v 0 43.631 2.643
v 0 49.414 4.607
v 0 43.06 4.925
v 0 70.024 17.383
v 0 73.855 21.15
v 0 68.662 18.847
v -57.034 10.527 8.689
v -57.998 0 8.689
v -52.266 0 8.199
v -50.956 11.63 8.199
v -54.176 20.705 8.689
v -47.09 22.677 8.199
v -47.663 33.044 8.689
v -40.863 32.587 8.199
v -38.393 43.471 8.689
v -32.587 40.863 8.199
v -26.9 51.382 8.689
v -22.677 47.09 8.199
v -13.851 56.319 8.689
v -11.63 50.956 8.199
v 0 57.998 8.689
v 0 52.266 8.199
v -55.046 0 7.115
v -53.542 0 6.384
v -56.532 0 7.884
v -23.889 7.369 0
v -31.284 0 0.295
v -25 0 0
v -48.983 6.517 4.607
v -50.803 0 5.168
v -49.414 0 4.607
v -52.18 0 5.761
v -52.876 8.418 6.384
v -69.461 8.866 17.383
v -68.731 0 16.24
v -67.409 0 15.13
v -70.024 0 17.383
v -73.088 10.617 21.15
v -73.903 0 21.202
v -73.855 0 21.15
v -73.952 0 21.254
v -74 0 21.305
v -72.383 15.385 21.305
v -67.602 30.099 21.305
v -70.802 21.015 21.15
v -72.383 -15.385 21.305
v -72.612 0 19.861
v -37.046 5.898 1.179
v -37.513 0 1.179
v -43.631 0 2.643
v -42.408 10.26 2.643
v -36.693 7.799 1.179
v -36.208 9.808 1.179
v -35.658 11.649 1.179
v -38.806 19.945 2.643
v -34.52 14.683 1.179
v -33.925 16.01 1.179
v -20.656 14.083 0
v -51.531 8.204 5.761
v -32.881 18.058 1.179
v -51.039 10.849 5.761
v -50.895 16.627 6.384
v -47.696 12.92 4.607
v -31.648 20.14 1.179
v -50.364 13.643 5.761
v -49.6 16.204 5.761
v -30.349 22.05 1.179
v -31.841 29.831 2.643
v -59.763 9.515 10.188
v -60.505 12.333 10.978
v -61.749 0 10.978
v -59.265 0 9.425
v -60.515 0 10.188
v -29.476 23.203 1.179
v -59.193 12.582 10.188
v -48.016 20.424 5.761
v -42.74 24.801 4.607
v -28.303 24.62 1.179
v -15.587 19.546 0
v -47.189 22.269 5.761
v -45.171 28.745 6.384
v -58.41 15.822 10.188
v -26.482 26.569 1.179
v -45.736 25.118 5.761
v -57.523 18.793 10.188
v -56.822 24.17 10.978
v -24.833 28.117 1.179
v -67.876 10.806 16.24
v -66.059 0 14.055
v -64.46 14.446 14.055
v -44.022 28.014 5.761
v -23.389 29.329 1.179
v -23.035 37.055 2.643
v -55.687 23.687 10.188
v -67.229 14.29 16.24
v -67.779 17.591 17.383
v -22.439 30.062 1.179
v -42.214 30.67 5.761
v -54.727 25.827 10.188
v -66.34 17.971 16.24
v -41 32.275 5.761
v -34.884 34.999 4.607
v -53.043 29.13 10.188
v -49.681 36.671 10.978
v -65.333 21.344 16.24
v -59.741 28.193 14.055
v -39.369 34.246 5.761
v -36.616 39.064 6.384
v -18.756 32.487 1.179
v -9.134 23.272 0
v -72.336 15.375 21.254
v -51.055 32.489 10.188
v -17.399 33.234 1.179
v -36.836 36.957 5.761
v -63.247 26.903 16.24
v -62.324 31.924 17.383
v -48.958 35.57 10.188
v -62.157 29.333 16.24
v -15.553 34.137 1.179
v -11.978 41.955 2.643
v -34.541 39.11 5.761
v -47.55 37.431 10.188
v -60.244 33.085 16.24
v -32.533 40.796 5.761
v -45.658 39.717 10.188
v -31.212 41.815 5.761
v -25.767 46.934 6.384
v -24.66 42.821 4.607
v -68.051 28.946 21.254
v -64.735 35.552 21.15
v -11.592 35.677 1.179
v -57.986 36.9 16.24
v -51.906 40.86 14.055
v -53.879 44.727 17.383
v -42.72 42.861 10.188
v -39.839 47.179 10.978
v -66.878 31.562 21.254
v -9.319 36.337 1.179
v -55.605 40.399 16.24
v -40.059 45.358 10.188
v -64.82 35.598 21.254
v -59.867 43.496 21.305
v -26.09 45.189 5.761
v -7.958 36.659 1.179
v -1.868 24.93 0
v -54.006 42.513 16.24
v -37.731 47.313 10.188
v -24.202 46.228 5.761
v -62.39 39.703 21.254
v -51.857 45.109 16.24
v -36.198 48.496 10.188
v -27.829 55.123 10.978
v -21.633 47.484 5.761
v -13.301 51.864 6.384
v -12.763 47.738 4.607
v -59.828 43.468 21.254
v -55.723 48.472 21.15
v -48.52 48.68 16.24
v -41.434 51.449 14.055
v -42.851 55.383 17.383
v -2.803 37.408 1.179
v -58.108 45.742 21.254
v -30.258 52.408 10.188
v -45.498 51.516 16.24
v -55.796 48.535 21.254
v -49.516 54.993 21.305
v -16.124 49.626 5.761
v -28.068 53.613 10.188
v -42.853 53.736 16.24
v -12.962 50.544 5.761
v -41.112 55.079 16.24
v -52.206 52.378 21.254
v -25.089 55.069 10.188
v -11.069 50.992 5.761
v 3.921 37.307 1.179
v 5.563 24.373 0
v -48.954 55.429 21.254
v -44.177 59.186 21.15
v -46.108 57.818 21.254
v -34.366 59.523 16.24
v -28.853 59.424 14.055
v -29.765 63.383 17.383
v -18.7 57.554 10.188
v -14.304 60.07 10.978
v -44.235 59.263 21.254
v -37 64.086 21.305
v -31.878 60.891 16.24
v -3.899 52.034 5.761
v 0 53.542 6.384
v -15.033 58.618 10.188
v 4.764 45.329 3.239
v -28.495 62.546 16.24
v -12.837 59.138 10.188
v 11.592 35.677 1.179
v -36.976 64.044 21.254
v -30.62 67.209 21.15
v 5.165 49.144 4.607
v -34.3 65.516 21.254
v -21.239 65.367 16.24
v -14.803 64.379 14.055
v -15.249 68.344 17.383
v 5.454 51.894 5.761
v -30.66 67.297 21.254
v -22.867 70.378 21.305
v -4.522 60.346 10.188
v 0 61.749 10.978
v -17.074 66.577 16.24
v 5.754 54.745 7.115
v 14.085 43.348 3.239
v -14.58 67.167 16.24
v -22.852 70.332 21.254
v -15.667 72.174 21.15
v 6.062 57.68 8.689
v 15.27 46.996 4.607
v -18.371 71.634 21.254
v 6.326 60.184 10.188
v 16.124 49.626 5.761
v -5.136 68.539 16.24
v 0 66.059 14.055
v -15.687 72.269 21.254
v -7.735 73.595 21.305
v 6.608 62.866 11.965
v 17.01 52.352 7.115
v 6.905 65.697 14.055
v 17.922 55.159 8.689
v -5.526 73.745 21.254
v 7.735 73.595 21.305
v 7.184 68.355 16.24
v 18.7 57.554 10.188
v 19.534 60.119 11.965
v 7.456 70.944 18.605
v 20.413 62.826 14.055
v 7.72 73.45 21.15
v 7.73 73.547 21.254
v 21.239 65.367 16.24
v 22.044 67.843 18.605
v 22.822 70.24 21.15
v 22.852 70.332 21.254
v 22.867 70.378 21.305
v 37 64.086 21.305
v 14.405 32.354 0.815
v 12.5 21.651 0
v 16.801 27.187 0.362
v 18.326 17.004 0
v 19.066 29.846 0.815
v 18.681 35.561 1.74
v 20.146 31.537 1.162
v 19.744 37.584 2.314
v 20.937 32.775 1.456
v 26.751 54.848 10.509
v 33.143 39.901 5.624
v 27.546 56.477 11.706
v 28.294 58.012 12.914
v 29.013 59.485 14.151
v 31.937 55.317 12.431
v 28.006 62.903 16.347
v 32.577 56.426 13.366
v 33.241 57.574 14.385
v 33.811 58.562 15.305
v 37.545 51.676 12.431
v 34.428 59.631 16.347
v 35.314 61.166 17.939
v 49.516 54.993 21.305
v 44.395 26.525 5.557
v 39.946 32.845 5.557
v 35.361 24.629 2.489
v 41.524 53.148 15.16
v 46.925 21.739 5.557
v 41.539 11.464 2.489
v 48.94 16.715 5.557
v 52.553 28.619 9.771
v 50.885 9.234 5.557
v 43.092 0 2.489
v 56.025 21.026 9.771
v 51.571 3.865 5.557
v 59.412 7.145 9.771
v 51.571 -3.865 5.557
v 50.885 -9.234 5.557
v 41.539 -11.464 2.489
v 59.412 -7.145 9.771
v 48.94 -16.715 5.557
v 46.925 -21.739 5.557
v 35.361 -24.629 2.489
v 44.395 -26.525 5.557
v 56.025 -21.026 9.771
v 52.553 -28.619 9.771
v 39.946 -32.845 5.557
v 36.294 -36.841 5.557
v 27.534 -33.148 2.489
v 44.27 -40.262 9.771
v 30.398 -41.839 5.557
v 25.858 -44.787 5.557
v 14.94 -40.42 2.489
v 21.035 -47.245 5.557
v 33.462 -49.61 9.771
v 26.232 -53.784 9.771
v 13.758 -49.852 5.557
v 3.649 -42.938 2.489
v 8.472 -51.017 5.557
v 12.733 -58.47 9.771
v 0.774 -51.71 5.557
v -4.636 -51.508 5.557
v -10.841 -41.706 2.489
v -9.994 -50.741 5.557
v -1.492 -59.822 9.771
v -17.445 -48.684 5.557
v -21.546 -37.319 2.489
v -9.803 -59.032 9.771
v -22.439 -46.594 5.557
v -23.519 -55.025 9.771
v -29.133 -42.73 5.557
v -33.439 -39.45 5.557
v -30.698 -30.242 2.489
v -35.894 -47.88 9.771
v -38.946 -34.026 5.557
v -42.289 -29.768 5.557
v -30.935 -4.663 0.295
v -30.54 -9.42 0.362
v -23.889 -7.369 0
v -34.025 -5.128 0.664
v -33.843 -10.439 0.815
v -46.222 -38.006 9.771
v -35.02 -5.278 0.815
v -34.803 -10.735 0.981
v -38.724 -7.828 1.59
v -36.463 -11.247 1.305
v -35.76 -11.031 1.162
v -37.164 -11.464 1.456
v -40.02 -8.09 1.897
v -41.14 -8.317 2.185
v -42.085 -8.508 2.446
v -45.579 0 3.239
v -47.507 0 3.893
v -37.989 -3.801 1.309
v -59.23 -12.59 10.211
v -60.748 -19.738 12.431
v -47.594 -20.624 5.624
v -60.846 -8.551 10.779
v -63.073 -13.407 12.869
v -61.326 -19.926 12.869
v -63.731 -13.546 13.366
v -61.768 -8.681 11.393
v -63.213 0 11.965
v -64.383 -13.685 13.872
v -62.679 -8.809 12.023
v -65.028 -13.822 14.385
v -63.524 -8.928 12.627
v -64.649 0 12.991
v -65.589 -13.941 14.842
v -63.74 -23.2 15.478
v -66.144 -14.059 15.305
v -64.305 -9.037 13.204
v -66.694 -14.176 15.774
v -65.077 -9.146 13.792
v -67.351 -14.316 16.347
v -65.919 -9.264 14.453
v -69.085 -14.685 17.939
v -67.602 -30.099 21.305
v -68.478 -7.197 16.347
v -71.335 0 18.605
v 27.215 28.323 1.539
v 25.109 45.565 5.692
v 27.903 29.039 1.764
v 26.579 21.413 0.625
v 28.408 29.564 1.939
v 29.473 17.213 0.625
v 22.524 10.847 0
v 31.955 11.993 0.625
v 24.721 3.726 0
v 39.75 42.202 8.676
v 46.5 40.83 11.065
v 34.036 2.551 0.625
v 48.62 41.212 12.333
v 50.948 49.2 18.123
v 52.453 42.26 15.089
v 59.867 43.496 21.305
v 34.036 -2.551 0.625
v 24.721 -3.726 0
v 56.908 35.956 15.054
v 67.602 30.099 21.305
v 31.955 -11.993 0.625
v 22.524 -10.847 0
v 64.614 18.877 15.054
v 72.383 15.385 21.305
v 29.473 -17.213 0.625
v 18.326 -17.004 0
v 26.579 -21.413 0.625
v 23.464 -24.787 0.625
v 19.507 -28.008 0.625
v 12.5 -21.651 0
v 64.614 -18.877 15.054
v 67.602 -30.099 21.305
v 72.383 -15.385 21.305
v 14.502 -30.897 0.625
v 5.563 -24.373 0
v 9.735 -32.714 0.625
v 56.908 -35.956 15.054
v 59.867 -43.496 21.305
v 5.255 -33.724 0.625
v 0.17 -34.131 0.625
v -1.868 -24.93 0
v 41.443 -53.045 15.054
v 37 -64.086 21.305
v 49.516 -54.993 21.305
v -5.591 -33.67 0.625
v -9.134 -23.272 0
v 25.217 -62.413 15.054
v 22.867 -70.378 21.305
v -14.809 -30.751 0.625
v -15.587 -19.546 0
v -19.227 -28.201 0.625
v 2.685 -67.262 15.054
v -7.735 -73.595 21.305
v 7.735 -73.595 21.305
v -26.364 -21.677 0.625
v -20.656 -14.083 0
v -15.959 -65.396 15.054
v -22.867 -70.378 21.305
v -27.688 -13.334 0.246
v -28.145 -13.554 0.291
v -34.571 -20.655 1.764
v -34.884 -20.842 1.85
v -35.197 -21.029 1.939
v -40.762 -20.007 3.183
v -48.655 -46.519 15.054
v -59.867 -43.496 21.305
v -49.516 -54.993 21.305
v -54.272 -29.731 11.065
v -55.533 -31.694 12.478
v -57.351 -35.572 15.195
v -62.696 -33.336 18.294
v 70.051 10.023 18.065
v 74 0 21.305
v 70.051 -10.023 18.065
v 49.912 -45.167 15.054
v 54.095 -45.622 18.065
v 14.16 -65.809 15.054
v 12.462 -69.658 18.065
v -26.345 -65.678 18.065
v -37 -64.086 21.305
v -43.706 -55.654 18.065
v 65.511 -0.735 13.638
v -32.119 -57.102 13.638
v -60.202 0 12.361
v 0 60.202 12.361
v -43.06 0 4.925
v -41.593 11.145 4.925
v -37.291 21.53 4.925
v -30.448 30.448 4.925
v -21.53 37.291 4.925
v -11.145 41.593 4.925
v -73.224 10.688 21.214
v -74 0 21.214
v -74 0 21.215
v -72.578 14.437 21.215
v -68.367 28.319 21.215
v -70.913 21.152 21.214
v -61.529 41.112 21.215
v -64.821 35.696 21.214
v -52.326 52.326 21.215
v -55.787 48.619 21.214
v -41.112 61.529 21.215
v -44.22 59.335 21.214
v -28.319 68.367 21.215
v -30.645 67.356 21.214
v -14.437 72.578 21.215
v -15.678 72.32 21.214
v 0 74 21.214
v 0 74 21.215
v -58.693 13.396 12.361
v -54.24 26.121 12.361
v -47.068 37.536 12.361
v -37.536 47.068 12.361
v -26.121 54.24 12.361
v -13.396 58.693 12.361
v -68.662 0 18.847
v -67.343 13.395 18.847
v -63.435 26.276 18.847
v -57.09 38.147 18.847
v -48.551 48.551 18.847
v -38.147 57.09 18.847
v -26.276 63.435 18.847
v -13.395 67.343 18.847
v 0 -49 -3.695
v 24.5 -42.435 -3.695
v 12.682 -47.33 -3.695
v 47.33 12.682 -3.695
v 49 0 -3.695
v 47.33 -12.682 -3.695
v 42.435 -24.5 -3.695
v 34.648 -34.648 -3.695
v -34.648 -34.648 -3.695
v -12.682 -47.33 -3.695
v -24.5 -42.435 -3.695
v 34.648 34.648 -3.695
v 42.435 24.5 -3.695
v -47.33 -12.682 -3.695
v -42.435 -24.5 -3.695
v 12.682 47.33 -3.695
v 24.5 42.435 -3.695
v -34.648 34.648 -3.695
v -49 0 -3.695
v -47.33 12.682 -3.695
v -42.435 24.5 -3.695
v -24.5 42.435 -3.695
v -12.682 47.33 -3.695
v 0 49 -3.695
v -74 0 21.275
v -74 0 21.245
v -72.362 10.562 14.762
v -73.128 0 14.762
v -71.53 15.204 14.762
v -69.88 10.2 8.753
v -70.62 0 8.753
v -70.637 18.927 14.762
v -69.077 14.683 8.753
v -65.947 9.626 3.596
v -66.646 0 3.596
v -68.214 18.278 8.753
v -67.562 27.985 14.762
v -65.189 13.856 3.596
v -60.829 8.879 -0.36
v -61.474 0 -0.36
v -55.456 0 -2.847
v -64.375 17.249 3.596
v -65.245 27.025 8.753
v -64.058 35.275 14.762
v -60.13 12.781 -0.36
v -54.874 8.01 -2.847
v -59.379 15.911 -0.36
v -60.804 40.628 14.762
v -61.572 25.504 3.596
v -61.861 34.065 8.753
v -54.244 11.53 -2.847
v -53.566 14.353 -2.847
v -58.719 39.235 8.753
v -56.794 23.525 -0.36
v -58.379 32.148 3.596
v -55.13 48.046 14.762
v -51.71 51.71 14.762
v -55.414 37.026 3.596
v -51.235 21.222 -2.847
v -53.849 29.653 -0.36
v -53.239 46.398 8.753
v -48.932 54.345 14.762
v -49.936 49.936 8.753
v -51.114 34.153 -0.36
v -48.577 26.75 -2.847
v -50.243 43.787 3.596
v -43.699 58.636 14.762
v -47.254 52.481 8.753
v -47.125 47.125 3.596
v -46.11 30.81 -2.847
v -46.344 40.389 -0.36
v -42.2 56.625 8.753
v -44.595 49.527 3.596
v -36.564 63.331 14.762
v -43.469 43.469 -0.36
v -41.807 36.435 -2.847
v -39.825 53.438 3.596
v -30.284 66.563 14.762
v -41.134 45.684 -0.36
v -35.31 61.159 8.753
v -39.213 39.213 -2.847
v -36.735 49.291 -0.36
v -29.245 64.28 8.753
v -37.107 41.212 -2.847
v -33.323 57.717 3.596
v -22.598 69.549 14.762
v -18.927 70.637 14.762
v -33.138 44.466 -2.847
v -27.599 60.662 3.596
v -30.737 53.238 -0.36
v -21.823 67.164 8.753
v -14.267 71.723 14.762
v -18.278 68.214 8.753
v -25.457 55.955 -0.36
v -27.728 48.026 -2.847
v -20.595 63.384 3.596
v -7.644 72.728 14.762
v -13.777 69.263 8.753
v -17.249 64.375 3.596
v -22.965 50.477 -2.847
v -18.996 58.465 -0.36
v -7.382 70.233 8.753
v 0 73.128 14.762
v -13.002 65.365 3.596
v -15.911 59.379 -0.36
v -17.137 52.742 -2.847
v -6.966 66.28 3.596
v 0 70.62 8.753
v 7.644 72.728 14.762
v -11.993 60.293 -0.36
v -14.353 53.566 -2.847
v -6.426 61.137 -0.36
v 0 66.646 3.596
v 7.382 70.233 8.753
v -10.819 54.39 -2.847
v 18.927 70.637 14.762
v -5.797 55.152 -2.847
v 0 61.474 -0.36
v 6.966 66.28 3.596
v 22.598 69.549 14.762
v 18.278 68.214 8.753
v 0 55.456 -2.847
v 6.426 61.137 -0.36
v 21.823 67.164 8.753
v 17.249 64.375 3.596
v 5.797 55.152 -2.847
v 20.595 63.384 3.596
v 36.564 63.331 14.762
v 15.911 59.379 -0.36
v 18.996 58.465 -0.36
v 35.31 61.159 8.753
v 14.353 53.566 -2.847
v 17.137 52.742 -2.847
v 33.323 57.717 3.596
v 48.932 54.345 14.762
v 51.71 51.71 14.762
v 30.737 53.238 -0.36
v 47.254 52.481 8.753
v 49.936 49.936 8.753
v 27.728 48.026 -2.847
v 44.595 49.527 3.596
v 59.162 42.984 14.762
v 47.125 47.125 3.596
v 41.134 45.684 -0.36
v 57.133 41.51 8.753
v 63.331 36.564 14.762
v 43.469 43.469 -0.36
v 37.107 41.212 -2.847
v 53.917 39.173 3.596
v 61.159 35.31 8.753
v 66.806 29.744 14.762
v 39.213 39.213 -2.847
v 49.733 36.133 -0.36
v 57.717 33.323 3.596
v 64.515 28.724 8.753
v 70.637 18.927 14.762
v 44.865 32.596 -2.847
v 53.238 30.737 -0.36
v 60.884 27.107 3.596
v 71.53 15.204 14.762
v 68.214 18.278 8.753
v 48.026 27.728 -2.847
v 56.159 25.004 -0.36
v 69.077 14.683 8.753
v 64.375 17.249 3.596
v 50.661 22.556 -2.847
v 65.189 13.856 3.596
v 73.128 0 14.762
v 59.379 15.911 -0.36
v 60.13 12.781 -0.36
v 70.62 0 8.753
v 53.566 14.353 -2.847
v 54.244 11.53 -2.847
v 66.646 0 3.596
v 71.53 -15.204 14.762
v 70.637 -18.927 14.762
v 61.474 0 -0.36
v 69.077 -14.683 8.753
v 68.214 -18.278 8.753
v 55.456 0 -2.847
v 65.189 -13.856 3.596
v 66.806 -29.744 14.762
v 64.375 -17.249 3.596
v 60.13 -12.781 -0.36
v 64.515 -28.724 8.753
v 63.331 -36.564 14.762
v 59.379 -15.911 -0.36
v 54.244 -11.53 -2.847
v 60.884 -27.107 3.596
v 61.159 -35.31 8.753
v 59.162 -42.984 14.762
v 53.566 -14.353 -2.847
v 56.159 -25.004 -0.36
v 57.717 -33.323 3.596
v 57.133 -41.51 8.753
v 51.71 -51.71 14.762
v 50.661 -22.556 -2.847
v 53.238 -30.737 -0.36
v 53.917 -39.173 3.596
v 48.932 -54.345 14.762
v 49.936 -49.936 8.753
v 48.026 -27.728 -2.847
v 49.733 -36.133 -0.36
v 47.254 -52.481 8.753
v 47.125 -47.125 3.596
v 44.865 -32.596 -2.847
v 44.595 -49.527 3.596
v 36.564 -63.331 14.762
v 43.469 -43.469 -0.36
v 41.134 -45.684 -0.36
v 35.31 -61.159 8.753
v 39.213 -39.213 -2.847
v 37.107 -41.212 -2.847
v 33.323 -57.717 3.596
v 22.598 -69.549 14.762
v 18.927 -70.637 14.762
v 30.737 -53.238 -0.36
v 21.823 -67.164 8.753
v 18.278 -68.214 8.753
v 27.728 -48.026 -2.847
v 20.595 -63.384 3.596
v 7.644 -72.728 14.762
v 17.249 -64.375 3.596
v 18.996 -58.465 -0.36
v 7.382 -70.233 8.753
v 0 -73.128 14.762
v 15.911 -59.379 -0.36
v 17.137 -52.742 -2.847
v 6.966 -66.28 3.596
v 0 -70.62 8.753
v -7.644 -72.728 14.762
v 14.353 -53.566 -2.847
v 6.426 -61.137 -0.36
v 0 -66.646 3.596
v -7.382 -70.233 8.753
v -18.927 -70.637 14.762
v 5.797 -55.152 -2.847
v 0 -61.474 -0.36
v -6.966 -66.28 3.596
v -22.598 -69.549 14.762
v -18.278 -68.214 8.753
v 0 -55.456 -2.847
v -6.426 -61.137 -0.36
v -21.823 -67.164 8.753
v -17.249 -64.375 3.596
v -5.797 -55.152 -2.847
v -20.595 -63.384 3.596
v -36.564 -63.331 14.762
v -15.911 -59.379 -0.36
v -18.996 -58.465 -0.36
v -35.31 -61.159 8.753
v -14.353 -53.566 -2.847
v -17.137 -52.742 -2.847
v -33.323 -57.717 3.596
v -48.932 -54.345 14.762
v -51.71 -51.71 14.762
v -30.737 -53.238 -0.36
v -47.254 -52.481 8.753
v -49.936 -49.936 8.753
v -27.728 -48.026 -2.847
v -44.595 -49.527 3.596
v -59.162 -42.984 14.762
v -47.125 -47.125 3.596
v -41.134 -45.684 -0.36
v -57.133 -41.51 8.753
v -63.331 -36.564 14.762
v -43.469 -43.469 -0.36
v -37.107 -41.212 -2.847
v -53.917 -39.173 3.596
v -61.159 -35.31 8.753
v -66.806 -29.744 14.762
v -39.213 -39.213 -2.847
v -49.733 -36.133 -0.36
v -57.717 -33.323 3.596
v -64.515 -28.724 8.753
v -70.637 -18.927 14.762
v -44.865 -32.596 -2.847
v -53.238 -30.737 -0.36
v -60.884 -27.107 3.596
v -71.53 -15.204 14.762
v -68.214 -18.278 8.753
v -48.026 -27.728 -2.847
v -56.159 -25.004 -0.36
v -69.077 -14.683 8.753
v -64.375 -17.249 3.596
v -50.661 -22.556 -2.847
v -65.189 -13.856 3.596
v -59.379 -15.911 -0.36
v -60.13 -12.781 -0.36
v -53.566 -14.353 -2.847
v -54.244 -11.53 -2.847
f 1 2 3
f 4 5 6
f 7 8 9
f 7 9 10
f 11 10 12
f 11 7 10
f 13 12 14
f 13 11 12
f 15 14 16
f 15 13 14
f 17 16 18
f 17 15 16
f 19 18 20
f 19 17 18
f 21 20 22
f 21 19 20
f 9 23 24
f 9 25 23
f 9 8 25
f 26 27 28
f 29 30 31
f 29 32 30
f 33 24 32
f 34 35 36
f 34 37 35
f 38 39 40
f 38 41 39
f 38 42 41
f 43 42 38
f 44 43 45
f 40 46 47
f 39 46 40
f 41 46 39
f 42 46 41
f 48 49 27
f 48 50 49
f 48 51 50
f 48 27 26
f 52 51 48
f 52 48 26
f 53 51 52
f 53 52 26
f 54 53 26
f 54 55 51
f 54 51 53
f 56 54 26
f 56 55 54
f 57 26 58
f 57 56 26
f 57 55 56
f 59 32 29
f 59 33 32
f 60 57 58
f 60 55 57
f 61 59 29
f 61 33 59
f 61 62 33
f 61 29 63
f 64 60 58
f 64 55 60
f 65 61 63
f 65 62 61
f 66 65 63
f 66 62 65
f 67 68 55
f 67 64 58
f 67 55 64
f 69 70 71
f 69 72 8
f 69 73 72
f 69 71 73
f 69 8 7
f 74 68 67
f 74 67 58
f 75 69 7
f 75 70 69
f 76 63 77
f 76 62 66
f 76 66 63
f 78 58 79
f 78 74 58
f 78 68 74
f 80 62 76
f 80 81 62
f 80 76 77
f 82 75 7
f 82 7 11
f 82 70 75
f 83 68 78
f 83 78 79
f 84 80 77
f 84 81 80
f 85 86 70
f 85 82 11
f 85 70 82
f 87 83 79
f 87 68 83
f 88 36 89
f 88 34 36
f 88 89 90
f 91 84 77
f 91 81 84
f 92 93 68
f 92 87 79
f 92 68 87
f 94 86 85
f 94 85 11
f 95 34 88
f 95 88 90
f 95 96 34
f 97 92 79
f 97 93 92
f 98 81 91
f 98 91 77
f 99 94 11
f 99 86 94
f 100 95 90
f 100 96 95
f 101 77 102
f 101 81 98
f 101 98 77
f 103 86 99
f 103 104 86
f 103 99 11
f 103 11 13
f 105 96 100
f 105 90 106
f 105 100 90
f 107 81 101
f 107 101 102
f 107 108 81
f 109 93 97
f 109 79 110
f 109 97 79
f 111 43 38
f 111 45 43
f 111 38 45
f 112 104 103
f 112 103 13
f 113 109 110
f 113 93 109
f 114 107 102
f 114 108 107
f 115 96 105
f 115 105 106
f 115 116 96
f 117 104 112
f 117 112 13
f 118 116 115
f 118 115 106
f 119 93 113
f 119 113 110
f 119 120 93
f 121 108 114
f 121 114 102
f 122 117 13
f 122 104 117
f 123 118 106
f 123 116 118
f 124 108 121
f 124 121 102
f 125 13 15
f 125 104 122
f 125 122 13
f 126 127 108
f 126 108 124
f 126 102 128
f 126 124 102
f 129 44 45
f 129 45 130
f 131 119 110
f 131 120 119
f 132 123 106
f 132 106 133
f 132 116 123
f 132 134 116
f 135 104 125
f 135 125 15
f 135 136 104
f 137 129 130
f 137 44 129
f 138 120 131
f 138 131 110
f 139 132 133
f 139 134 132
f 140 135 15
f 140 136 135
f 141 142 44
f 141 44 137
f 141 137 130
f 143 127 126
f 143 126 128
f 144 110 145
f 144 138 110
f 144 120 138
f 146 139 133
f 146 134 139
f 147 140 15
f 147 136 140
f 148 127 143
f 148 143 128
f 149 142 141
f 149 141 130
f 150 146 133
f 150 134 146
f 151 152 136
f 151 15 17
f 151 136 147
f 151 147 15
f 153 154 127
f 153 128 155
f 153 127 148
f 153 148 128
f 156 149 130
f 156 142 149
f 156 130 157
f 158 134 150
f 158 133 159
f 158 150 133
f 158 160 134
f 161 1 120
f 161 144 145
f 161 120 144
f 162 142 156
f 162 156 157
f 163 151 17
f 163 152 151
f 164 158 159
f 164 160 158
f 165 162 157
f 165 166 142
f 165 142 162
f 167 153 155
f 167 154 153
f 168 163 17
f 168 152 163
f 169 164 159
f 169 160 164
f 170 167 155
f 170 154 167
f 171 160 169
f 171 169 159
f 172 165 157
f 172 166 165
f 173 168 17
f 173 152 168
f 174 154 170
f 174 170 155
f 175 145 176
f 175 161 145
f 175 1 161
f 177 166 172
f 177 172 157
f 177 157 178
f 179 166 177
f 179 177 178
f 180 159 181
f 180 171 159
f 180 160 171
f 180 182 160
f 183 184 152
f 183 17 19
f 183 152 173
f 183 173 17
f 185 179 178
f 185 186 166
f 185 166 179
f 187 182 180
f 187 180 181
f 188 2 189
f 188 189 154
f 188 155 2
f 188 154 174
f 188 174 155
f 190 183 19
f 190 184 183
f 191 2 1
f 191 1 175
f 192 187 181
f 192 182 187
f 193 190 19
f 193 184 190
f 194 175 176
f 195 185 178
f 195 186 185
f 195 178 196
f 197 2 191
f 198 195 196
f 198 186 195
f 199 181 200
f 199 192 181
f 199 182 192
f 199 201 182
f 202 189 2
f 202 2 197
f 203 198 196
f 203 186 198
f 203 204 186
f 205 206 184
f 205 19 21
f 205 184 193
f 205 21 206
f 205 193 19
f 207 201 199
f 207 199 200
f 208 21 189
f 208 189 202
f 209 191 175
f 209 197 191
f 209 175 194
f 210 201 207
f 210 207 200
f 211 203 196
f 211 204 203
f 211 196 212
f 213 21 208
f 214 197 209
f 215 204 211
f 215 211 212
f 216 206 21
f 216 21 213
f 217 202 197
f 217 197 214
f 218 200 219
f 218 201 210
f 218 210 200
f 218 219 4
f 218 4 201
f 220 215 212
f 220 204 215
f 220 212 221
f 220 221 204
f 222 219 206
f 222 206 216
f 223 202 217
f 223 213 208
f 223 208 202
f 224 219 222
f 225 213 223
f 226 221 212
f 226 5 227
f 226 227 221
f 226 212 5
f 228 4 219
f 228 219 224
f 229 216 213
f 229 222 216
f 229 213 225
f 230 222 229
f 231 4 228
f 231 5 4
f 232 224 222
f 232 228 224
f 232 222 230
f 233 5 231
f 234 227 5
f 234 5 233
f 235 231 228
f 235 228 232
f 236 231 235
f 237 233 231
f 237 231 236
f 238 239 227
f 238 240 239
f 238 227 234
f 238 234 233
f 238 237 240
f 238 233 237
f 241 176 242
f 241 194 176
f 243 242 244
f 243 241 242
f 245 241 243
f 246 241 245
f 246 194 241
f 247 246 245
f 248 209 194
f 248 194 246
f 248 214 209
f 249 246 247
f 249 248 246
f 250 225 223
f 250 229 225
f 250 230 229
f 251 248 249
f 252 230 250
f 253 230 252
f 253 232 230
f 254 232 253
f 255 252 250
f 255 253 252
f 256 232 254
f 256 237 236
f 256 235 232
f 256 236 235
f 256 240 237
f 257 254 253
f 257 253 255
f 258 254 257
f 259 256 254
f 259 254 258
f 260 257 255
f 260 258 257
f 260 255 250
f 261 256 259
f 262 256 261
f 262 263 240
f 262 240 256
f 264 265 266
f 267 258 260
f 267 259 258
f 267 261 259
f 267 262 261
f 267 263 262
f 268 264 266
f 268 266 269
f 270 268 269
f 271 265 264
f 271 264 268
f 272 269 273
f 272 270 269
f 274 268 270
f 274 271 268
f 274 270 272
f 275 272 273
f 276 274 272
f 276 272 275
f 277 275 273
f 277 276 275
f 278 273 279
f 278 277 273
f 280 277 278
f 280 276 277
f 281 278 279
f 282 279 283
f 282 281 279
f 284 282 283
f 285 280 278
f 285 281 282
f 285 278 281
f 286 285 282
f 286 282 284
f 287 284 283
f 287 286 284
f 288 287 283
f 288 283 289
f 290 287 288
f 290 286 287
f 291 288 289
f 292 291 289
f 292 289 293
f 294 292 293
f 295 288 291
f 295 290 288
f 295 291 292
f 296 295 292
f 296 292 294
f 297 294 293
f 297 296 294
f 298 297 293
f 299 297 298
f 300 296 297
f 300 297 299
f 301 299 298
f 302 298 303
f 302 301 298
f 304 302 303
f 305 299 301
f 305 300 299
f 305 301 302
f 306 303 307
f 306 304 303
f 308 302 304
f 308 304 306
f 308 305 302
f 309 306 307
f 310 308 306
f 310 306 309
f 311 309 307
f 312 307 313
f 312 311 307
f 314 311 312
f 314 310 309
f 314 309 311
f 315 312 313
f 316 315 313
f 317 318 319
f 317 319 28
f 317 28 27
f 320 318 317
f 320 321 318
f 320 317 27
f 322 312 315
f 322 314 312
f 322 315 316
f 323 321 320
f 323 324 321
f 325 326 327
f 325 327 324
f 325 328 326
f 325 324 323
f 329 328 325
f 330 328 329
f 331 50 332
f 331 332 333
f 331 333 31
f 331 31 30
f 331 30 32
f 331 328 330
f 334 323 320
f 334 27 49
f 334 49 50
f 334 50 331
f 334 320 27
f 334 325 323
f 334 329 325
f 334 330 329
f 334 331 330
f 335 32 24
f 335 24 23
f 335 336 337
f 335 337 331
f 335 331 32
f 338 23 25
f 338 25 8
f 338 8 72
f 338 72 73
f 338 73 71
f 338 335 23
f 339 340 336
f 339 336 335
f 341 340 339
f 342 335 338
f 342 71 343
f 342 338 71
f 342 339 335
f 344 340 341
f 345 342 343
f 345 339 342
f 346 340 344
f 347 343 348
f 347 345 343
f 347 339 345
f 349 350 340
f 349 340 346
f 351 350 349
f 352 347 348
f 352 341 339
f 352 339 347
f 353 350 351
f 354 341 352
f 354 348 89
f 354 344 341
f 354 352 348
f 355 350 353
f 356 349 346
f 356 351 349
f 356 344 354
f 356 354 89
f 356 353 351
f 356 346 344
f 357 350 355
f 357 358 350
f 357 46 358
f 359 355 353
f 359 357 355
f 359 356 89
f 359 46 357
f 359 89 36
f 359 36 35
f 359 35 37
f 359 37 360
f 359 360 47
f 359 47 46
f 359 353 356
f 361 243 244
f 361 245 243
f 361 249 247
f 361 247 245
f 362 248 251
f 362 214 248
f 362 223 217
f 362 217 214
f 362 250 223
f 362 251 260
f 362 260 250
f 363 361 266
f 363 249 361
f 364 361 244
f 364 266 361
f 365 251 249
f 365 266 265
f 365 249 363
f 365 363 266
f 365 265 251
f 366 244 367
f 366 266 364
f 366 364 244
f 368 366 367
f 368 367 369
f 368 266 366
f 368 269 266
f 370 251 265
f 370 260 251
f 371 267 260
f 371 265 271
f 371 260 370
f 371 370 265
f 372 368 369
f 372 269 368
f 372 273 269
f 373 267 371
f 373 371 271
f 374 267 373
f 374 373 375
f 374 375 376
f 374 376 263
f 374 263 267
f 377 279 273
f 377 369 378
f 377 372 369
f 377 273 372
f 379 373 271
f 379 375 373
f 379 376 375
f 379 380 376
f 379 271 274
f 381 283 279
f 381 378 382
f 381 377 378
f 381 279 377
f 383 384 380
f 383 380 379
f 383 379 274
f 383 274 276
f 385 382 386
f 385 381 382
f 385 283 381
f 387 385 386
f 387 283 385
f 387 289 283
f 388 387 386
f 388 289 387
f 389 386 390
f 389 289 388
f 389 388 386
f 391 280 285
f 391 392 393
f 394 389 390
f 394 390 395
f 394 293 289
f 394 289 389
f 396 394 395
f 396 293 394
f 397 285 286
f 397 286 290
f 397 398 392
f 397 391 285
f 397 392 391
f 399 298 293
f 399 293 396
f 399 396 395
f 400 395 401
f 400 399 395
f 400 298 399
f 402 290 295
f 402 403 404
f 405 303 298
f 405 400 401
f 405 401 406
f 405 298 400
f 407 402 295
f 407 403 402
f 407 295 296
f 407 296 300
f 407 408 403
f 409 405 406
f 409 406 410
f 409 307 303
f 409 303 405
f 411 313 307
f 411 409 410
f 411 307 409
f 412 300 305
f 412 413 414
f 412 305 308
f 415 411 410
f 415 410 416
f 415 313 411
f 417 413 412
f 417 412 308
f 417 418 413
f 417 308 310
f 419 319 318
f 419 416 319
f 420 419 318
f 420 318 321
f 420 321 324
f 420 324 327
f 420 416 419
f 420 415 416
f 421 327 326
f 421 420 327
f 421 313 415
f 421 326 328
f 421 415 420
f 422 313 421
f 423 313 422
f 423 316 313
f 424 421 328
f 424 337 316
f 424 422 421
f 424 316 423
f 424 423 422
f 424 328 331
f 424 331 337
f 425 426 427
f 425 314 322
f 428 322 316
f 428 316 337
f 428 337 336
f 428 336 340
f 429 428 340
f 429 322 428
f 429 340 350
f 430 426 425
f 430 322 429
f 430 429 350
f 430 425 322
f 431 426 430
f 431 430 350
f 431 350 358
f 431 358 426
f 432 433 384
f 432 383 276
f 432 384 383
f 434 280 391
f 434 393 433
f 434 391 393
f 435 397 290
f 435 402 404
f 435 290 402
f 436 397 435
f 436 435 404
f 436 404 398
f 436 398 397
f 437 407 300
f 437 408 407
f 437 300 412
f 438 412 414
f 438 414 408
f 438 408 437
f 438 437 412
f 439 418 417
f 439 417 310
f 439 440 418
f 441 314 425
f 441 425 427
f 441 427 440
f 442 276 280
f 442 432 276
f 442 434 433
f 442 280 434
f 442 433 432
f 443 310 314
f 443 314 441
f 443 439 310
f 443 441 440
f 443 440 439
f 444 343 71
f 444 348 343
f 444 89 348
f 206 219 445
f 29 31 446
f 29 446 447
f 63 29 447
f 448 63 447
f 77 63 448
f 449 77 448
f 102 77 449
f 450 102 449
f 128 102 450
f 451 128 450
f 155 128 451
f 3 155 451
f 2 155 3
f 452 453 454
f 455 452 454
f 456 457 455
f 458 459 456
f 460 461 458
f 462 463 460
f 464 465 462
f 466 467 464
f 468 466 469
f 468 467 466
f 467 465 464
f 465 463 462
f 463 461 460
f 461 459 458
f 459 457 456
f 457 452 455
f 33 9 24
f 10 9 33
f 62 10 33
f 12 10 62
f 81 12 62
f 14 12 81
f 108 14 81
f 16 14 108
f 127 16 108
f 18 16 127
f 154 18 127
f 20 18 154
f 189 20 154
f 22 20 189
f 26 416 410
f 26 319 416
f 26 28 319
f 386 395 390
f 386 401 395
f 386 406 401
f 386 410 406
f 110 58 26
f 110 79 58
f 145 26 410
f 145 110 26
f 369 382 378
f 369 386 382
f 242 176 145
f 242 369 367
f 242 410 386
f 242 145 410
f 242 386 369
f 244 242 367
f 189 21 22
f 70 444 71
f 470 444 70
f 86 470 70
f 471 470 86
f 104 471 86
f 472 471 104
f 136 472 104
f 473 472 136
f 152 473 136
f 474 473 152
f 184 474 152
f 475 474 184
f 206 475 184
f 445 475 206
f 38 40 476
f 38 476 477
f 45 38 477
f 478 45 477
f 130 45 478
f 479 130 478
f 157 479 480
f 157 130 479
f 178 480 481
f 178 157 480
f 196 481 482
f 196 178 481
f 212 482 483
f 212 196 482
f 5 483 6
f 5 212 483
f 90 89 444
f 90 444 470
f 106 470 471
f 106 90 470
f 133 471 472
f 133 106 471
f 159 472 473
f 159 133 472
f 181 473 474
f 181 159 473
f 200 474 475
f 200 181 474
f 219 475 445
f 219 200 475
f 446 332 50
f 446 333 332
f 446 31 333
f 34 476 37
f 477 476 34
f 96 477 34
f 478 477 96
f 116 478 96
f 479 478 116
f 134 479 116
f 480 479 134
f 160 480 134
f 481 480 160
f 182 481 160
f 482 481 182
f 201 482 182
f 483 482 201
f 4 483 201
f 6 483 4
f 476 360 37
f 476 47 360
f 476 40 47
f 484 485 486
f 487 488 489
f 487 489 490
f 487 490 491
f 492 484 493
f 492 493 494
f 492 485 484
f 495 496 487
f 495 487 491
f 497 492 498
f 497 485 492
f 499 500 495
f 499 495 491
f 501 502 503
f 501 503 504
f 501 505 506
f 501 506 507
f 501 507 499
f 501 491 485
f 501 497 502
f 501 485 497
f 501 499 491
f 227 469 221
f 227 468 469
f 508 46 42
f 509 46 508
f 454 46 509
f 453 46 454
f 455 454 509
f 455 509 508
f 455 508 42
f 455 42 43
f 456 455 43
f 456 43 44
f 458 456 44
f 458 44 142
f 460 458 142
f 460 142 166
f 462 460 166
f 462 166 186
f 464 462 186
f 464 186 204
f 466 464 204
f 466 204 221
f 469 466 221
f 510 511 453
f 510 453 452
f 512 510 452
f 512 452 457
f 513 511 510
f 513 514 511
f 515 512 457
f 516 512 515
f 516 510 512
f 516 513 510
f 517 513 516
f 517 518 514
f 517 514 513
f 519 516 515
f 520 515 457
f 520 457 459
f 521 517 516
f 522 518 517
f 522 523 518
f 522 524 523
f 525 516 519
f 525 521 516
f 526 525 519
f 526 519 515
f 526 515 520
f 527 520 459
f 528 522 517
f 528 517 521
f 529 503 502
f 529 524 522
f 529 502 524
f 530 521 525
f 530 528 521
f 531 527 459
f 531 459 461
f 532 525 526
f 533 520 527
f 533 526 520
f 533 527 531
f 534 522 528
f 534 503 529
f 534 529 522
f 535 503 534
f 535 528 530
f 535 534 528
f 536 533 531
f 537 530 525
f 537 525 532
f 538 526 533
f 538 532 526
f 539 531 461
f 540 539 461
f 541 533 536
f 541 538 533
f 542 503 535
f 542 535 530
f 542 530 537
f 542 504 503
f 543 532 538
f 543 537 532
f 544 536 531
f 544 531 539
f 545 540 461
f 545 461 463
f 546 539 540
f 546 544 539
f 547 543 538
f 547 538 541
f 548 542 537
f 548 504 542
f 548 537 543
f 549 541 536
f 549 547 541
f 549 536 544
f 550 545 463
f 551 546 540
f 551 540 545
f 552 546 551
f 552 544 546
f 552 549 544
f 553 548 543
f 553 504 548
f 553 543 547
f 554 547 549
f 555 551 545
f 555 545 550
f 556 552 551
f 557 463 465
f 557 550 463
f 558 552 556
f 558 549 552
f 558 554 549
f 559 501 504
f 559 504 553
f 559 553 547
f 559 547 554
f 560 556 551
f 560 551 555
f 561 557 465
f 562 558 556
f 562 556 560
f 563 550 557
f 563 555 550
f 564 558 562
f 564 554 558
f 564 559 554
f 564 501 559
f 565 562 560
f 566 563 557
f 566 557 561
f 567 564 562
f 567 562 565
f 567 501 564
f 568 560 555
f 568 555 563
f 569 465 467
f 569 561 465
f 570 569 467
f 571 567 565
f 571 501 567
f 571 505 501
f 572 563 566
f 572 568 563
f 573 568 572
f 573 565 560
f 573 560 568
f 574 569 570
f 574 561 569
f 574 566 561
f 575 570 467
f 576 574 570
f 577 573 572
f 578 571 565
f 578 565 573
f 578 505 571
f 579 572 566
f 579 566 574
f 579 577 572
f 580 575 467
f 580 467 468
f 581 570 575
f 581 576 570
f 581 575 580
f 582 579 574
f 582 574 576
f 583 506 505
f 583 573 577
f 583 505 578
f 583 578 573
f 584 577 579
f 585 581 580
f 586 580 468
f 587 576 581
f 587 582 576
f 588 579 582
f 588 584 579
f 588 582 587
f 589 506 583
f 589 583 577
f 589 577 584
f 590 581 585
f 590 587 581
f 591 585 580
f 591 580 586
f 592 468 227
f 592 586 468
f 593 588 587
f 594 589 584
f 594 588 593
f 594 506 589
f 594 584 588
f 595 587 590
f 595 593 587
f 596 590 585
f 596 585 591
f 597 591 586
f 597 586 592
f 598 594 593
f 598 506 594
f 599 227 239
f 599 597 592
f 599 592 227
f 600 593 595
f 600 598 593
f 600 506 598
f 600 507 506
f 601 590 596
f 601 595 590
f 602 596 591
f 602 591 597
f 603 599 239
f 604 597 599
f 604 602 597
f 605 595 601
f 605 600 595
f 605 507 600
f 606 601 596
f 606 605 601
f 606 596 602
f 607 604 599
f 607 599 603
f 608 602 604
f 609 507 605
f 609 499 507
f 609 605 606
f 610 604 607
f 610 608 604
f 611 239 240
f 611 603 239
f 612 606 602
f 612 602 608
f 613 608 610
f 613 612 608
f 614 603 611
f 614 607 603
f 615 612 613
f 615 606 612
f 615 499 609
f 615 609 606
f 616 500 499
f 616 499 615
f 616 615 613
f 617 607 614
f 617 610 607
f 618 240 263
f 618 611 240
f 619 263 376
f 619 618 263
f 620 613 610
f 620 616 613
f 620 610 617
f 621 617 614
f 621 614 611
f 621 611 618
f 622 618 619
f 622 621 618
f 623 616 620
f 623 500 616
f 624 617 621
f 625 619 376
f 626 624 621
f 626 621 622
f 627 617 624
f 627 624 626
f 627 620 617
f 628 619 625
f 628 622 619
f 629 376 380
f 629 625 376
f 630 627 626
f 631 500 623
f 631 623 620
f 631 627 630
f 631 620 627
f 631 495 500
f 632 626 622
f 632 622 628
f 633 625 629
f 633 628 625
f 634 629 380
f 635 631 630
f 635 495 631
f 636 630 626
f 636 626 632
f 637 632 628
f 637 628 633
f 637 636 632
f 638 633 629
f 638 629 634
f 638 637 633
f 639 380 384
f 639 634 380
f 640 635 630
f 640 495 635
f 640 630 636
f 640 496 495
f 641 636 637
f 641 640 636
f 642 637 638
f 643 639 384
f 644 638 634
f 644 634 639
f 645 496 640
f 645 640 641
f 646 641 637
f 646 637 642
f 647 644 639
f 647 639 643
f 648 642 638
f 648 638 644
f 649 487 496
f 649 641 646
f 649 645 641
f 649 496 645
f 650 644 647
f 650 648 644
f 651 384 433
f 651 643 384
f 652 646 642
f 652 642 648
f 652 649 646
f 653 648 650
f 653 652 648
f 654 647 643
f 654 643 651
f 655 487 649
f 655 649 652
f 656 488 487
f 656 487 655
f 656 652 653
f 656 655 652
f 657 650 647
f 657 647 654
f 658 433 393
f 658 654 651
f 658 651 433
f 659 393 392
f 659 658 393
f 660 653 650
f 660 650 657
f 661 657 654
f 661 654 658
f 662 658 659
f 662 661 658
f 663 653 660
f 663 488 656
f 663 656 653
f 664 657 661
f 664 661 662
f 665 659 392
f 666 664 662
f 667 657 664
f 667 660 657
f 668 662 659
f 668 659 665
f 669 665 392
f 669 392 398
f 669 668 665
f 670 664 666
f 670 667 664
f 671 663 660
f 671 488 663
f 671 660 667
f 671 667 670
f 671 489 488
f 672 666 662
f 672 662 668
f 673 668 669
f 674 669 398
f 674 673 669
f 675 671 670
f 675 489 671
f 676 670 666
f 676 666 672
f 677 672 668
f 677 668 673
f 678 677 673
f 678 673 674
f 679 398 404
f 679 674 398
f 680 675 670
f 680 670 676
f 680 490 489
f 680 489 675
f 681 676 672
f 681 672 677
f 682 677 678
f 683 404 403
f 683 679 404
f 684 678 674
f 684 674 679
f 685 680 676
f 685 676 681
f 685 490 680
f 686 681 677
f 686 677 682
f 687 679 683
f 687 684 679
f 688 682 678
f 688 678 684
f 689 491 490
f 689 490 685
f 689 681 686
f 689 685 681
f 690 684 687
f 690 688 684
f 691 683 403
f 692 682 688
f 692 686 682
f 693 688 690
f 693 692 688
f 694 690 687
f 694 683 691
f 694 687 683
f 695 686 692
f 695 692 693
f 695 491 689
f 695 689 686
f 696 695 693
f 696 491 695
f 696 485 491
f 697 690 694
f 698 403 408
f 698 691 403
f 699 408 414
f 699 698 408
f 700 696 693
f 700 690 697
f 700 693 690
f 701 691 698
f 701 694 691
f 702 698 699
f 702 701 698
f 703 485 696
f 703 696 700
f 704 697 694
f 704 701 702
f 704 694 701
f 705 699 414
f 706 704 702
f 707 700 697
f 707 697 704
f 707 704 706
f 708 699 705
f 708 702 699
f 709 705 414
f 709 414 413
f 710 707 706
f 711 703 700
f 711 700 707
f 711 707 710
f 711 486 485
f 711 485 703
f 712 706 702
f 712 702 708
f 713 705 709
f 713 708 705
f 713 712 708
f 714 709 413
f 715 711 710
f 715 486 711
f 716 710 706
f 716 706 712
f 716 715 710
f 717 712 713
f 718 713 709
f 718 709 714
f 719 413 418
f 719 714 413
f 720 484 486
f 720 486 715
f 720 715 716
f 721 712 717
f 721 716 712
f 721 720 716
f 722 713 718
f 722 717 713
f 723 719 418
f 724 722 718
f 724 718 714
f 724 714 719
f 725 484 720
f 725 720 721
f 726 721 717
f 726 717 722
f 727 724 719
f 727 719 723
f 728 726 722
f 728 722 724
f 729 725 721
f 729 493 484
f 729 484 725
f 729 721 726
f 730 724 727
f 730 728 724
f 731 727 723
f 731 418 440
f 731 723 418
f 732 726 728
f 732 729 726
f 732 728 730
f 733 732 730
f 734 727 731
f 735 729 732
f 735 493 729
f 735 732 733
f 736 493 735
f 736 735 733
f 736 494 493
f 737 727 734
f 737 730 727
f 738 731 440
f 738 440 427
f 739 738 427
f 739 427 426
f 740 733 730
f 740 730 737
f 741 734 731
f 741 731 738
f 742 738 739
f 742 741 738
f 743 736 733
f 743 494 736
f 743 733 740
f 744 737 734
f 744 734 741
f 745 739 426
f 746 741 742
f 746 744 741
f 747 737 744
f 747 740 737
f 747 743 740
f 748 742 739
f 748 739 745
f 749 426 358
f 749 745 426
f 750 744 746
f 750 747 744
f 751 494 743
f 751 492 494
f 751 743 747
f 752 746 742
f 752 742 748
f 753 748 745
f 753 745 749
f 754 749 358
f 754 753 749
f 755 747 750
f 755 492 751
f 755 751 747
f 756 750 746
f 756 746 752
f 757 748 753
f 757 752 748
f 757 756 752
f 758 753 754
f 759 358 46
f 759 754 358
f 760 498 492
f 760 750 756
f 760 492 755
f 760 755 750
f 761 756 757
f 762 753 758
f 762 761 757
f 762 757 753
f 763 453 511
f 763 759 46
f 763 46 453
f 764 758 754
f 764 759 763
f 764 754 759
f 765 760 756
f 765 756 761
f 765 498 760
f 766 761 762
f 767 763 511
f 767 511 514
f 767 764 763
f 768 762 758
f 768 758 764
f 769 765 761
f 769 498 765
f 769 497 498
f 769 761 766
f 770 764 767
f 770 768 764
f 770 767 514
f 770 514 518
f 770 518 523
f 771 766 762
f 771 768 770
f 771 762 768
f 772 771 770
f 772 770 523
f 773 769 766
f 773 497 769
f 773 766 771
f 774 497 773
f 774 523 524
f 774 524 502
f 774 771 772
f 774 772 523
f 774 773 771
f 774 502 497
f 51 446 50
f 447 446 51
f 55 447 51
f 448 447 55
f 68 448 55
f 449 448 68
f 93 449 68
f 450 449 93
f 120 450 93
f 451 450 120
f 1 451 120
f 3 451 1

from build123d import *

# Parameters (mm, degrees)
F2_R     = 24.99999
F4_ANGLE = 90


# Not quite as in the source:
# - a fillet or chamfer is up to 0.001 mm smaller than in the source, because OpenCascade refuses the exact size


with BuildPart() as f1:
    # F0 (on Front) → F1 (revolve)
    with BuildSketch(Plane.XZ):
        with BuildLine():
            Line((0, -3.6946386352), (0, 0))
            Line((0, 0), (-25, 0))
            ThreePointArc((-25, 0), (-51.7157183269, 5.5567709647), (-74, 21.3053613648))
            Line((-74, 21.3053613648), (-74, -3.6946386352))
            Line((-74, -3.6946386352), (0, -3.6946386352))
        make_face()
    revolve(axis=Axis((0, 0, -1.8473193176), (0, 0, -1)))

    # F2 (radius 25 in the source; OpenCascade refuses exactly that, so slightly less here)
    f2_edges = [f1.edges().sort_by_distance(p)[0] for p in [
        (74, 0, -3.694639),
    ]]
    fillet(f2_edges, radius=F2_R)

    # F3 (on Front) → F4 (revolve)
    with BuildSketch(Plane.XZ):
        with BuildLine():
            Line((-70.0587433731, 17.3462673245), (-74, 21.2146713292))
            ThreePointArc((-74, 21.2146713292), (-72.0691293591, 19.2399629087), (-70.0587433731, 17.3462673245))
        make_face()
        Polygon((-43.0603352406, 4.9253203614), (-49.4471145262, 4.6049726638), (-43.633293695, 2.6351734955), align=None)
        with BuildLine():
            Line((-43.633293695, 2.6351734955), (-49.4471145262, 4.6049726638))
            ThreePointArc((-49.4471145262, 4.6049726638), (-46.5627090209, 3.5536503103), (-43.633293695, 2.6351734955))
        make_face()
        Polygon((-52.2661279734, 8.1985627052), (-58.0582865363, 8.6943420701), (-53.5528416158, 6.368114131), align=None)
        with BuildLine():
            Line((-53.5528416158, 6.368114131), (-58.0582865363, 8.6943420701))
            ThreePointArc((-58.0582865363, 8.6943420701), (-55.8275138821, 7.4887156535), (-53.5528416158, 6.368114131))
        make_face()
        Polygon((-60.2023862302, 12.3613774776), (-66.1655854553, 14.085889627), (-61.7737689908, 10.9556044658), align=None)
        with BuildLine():
            Line((-61.7737689908, 10.9556044658), (-66.1655854553, 14.085889627))
            ThreePointArc((-66.1655854553, 14.085889627), (-64.001095038, 12.4766675871), (-61.7737689908, 10.9556044658))
        make_face()
        Polygon((-68.6619466735, 18.8474147571), (-74, 21.2146713292), (-70.0587433731, 17.3462673245), align=None)
    revolve(axis=Axis((0, 0, -1.1001997627), (0, 0, -1)), revolution_arc=F4_ANGLE)


solid = f1.part
